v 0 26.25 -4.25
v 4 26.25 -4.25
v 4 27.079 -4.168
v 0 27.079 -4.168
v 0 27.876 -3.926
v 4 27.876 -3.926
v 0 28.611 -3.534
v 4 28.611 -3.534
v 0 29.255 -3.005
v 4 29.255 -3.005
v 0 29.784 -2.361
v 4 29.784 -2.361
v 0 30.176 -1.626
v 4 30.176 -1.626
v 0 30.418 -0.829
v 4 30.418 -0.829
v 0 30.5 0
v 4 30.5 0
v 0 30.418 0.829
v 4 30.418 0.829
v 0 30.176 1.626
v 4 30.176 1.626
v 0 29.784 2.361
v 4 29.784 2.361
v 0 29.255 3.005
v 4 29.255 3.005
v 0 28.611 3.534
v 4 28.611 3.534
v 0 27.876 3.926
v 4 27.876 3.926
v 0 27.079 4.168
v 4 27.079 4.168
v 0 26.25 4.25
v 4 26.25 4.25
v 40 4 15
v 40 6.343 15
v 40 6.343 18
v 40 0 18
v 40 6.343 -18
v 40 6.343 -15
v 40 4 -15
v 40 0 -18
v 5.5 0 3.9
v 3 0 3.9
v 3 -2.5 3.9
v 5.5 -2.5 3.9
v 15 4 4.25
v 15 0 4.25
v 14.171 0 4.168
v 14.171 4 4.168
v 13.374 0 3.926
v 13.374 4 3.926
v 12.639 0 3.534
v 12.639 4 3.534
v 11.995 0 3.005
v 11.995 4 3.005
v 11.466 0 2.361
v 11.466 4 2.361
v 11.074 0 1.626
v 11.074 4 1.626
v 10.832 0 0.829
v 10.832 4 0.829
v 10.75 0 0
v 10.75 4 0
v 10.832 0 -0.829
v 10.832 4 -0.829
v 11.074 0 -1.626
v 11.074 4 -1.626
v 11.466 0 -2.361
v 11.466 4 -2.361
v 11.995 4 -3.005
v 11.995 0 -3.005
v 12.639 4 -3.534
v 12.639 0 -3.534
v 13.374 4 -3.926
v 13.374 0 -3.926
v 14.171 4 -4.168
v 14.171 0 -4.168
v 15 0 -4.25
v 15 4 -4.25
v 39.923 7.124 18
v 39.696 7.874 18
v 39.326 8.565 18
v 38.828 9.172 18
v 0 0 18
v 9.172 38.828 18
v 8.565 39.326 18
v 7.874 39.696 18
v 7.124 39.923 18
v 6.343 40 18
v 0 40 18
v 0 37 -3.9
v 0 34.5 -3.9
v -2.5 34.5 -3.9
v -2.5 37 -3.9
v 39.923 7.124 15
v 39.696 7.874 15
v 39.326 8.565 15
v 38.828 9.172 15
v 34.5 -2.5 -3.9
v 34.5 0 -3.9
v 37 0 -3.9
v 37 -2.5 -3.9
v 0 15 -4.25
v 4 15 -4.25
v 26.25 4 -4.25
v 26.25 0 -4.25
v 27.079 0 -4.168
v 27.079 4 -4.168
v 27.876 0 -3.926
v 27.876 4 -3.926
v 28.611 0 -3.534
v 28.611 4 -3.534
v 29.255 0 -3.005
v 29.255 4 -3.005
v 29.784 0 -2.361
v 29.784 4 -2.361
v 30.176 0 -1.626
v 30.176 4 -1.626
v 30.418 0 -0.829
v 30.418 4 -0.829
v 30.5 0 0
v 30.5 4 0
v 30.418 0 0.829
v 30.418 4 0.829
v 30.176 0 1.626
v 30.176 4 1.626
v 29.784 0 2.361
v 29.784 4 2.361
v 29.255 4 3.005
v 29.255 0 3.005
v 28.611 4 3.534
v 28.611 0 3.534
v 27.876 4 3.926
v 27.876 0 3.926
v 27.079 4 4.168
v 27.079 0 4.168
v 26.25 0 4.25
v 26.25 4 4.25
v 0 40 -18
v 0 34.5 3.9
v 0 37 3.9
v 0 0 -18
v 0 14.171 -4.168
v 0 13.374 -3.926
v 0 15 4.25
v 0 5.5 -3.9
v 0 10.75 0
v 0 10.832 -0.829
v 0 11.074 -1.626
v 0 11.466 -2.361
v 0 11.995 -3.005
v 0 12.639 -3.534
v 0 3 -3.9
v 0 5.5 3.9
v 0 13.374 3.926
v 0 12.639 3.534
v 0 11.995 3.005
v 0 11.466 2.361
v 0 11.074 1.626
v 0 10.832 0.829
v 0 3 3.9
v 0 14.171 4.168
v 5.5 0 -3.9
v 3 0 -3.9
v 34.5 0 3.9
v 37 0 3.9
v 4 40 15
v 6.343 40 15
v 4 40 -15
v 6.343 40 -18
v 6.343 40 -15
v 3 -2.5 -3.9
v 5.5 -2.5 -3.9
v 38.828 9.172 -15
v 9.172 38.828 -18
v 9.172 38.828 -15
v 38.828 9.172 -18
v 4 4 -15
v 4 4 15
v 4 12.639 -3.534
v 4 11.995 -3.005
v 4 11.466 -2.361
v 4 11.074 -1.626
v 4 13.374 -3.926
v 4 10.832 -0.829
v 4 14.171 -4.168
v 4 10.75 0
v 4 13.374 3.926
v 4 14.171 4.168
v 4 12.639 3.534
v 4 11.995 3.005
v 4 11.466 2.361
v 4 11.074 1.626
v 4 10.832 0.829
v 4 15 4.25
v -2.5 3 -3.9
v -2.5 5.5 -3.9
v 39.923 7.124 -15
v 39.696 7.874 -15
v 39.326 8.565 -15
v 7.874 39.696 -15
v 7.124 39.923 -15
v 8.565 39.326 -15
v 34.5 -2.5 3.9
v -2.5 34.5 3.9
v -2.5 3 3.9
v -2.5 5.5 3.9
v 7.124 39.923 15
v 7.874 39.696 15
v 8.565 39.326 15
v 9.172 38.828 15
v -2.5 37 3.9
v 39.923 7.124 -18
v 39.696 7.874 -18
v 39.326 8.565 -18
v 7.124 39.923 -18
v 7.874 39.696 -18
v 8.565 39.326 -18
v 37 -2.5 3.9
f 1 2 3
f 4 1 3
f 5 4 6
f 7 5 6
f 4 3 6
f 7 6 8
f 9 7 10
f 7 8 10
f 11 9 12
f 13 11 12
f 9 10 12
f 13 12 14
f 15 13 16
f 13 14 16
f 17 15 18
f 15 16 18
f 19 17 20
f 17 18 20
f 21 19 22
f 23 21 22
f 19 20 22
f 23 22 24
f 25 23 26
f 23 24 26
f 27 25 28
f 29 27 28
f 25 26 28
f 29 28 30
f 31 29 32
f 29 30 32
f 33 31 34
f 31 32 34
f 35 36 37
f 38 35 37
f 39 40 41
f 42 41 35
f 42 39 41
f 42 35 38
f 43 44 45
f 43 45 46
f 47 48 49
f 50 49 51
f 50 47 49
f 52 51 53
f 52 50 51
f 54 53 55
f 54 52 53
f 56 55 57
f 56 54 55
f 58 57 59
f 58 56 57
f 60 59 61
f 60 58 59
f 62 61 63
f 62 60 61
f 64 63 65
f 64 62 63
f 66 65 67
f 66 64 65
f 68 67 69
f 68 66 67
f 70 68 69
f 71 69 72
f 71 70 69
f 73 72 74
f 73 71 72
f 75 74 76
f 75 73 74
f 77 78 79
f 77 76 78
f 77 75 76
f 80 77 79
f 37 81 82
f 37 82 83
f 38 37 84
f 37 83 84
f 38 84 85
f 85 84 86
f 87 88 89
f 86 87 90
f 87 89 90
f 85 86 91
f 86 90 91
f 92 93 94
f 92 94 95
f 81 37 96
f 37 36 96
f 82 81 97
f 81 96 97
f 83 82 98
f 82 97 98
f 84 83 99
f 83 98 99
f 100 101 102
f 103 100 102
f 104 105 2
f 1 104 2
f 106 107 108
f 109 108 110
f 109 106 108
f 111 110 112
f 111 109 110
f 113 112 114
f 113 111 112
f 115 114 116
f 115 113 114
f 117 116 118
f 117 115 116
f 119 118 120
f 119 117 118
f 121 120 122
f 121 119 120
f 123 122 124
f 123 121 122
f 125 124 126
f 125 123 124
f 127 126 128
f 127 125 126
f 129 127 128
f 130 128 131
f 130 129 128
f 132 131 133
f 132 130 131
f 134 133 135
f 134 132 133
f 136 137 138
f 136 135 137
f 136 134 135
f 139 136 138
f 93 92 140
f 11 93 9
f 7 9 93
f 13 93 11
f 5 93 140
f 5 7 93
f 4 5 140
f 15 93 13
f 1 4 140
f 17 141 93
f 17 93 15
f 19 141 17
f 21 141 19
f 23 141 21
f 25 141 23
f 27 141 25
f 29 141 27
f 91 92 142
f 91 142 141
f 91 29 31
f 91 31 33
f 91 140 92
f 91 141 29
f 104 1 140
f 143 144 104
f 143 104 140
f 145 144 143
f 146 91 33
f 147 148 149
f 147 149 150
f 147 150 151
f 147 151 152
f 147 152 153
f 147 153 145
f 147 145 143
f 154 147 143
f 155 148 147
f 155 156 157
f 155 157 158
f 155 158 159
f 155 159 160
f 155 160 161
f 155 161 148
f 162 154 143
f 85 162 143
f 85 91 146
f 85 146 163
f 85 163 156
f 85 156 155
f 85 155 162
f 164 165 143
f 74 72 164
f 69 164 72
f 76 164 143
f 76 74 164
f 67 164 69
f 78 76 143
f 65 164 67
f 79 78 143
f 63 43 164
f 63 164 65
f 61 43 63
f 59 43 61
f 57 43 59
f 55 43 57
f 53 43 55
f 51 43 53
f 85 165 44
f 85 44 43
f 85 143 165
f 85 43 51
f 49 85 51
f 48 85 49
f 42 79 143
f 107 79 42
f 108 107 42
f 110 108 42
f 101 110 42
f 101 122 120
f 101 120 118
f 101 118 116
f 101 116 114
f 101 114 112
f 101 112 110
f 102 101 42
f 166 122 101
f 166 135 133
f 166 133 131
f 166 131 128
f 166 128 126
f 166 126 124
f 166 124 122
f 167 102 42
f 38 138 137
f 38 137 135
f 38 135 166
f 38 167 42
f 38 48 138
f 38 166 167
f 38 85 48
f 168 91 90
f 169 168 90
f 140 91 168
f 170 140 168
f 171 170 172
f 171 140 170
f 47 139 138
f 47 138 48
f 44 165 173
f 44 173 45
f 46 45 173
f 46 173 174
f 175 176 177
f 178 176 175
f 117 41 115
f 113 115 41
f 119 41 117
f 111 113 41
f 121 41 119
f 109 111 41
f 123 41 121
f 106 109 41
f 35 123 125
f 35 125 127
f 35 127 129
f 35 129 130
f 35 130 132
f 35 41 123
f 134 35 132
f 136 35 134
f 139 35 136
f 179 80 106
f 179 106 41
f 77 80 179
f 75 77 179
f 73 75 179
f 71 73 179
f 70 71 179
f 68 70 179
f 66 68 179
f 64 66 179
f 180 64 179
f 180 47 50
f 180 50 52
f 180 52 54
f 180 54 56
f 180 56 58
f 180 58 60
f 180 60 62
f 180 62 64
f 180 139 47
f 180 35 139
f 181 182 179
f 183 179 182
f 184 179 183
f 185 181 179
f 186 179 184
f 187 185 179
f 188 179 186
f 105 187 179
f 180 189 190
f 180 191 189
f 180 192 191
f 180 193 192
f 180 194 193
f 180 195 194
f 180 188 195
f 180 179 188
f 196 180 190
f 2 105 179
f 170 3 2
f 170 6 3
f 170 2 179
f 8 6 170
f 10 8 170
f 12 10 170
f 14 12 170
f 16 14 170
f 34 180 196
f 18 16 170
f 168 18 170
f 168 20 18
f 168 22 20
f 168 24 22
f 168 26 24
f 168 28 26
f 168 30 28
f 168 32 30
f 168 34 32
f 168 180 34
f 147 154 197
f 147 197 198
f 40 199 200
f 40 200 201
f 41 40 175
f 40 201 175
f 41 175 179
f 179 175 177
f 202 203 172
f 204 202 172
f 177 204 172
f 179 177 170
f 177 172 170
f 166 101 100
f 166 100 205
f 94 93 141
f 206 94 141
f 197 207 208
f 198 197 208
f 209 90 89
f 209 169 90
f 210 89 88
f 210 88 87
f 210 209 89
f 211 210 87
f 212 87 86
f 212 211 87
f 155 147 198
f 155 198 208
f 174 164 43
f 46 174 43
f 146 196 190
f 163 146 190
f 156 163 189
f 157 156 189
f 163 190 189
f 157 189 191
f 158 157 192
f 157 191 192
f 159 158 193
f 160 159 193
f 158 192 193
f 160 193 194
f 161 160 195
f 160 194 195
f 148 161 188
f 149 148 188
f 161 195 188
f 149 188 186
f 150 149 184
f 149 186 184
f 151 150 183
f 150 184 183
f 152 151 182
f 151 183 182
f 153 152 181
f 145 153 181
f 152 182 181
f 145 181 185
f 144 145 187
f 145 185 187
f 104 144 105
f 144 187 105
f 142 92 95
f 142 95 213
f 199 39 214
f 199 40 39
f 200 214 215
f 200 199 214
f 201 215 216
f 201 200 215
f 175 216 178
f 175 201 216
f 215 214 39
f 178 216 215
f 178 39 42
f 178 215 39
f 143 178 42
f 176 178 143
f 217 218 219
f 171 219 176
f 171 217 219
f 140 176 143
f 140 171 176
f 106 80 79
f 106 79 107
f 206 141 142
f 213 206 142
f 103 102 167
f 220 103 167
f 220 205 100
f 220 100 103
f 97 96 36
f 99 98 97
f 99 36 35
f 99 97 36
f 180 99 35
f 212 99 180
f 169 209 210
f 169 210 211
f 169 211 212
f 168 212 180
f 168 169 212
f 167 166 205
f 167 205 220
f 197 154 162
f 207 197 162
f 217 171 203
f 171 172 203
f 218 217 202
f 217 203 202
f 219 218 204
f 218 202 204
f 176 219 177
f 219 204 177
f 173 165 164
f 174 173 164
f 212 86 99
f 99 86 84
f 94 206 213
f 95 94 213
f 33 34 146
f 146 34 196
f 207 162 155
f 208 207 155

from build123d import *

# Parameters (mm, degrees)
EXTRUDE_1_DEPTH        = 18
EXTRUDE_2_DEPTH        = 3
FILLET_1_R             = 4
FILLET_1_OF_MIRROR_2_R = 4
CUT_EXTRUDE_1_DEPTH    = 5
SKETCH_4_W             = 2.5
SKETCH_4_H             = 7.8
EXTRUDE_3_DEPTH        = 2.5


with BuildPart() as part:
    # Эскиз1 → Бобышка-Вытянуть1 (new body, symmetric)
    with BuildSketch(Plane.XY):
        Polygon((0, 40), (0, 0), (40, 0), (40, 4), (4, 4), (4, 40), align=None)
    extrude(amount=EXTRUDE_1_DEPTH, both=True)

    # Эскиз2 → Бобышка-Вытянуть2 (add)
    with BuildSketch(Plane.XY.offset(18)):
        Polygon((40, 4), (4, 4), (4, 40), (8, 40), (40, 8), align=None)
    extrude_2 = extrude(amount=-EXTRUDE_2_DEPTH)

    # Скругление1
    fillet_1_edges = [part.edges().sort_by_distance(p)[0] for p in [
        (8, 40, 16.5),
        (40, 8, 16.5),
    ]]
    fillet(fillet_1_edges, radius=FILLET_1_R)

    # Зеркальное отражение2: Бобышка-Вытянуть2 across plane
    add(extrude_2.mirror(Plane.XY))

    # Скругление1 of Зеркальное отражение2
    fillet_1_of_mirror_2_edges = [part.edges().sort_by_distance(p)[0] for p in [
        (8, 40, -16.5),
        (40, 8, -16.5),
    ]]
    fillet(fillet_1_of_mirror_2_edges, radius=FILLET_1_OF_MIRROR_2_R)

    # Эскиз3 → Вырез-Вытянуть1 (cut, through all)
    with BuildSketch(Plane(origin=(0, 4, 0), x_dir=(1, 0, 0), z_dir=(0, 1, 0))):
        with BuildLine():
            Line((15, 4.25), (26.25, 4.25))
            ThreePointArc((26.25, 4.25), (30.5, 0), (26.25, -4.25))
            Line((26.25, -4.25), (15, -4.25))
            ThreePointArc((15, -4.25), (10.75, 0), (15, 4.25))
        make_face()
    cut_extrude_1 = extrude(amount=-CUT_EXTRUDE_1_DEPTH, mode=Mode.SUBTRACT)

    # Эскиз4 → Бобышка-Вытянуть3 (add)
    with BuildSketch(Plane.XZ):
        with Locations((4.25, 0)):
            Rectangle(SKETCH_4_W, SKETCH_4_H)
        with Locations((35.75, 0)):
            Rectangle(SKETCH_4_W, SKETCH_4_H)
    extrude_3 = extrude(amount=EXTRUDE_3_DEPTH)

    # Зеркальное отражение3: Вырез-Вытянуть1, Бобышка-Вытянуть3 across plane
    add(cut_extrude_1.mirror(Plane(origin=(0, 0, 0), x_dir=(0, 0, 1), z_dir=(-0.707106781, 0.707106781, 0))), mode=Mode.SUBTRACT)
    add(extrude_3.mirror(Plane(origin=(0, 0, 0), x_dir=(0, 0, 1), z_dir=(-0.707106781, 0.707106781, 0))))


solid = part.part
